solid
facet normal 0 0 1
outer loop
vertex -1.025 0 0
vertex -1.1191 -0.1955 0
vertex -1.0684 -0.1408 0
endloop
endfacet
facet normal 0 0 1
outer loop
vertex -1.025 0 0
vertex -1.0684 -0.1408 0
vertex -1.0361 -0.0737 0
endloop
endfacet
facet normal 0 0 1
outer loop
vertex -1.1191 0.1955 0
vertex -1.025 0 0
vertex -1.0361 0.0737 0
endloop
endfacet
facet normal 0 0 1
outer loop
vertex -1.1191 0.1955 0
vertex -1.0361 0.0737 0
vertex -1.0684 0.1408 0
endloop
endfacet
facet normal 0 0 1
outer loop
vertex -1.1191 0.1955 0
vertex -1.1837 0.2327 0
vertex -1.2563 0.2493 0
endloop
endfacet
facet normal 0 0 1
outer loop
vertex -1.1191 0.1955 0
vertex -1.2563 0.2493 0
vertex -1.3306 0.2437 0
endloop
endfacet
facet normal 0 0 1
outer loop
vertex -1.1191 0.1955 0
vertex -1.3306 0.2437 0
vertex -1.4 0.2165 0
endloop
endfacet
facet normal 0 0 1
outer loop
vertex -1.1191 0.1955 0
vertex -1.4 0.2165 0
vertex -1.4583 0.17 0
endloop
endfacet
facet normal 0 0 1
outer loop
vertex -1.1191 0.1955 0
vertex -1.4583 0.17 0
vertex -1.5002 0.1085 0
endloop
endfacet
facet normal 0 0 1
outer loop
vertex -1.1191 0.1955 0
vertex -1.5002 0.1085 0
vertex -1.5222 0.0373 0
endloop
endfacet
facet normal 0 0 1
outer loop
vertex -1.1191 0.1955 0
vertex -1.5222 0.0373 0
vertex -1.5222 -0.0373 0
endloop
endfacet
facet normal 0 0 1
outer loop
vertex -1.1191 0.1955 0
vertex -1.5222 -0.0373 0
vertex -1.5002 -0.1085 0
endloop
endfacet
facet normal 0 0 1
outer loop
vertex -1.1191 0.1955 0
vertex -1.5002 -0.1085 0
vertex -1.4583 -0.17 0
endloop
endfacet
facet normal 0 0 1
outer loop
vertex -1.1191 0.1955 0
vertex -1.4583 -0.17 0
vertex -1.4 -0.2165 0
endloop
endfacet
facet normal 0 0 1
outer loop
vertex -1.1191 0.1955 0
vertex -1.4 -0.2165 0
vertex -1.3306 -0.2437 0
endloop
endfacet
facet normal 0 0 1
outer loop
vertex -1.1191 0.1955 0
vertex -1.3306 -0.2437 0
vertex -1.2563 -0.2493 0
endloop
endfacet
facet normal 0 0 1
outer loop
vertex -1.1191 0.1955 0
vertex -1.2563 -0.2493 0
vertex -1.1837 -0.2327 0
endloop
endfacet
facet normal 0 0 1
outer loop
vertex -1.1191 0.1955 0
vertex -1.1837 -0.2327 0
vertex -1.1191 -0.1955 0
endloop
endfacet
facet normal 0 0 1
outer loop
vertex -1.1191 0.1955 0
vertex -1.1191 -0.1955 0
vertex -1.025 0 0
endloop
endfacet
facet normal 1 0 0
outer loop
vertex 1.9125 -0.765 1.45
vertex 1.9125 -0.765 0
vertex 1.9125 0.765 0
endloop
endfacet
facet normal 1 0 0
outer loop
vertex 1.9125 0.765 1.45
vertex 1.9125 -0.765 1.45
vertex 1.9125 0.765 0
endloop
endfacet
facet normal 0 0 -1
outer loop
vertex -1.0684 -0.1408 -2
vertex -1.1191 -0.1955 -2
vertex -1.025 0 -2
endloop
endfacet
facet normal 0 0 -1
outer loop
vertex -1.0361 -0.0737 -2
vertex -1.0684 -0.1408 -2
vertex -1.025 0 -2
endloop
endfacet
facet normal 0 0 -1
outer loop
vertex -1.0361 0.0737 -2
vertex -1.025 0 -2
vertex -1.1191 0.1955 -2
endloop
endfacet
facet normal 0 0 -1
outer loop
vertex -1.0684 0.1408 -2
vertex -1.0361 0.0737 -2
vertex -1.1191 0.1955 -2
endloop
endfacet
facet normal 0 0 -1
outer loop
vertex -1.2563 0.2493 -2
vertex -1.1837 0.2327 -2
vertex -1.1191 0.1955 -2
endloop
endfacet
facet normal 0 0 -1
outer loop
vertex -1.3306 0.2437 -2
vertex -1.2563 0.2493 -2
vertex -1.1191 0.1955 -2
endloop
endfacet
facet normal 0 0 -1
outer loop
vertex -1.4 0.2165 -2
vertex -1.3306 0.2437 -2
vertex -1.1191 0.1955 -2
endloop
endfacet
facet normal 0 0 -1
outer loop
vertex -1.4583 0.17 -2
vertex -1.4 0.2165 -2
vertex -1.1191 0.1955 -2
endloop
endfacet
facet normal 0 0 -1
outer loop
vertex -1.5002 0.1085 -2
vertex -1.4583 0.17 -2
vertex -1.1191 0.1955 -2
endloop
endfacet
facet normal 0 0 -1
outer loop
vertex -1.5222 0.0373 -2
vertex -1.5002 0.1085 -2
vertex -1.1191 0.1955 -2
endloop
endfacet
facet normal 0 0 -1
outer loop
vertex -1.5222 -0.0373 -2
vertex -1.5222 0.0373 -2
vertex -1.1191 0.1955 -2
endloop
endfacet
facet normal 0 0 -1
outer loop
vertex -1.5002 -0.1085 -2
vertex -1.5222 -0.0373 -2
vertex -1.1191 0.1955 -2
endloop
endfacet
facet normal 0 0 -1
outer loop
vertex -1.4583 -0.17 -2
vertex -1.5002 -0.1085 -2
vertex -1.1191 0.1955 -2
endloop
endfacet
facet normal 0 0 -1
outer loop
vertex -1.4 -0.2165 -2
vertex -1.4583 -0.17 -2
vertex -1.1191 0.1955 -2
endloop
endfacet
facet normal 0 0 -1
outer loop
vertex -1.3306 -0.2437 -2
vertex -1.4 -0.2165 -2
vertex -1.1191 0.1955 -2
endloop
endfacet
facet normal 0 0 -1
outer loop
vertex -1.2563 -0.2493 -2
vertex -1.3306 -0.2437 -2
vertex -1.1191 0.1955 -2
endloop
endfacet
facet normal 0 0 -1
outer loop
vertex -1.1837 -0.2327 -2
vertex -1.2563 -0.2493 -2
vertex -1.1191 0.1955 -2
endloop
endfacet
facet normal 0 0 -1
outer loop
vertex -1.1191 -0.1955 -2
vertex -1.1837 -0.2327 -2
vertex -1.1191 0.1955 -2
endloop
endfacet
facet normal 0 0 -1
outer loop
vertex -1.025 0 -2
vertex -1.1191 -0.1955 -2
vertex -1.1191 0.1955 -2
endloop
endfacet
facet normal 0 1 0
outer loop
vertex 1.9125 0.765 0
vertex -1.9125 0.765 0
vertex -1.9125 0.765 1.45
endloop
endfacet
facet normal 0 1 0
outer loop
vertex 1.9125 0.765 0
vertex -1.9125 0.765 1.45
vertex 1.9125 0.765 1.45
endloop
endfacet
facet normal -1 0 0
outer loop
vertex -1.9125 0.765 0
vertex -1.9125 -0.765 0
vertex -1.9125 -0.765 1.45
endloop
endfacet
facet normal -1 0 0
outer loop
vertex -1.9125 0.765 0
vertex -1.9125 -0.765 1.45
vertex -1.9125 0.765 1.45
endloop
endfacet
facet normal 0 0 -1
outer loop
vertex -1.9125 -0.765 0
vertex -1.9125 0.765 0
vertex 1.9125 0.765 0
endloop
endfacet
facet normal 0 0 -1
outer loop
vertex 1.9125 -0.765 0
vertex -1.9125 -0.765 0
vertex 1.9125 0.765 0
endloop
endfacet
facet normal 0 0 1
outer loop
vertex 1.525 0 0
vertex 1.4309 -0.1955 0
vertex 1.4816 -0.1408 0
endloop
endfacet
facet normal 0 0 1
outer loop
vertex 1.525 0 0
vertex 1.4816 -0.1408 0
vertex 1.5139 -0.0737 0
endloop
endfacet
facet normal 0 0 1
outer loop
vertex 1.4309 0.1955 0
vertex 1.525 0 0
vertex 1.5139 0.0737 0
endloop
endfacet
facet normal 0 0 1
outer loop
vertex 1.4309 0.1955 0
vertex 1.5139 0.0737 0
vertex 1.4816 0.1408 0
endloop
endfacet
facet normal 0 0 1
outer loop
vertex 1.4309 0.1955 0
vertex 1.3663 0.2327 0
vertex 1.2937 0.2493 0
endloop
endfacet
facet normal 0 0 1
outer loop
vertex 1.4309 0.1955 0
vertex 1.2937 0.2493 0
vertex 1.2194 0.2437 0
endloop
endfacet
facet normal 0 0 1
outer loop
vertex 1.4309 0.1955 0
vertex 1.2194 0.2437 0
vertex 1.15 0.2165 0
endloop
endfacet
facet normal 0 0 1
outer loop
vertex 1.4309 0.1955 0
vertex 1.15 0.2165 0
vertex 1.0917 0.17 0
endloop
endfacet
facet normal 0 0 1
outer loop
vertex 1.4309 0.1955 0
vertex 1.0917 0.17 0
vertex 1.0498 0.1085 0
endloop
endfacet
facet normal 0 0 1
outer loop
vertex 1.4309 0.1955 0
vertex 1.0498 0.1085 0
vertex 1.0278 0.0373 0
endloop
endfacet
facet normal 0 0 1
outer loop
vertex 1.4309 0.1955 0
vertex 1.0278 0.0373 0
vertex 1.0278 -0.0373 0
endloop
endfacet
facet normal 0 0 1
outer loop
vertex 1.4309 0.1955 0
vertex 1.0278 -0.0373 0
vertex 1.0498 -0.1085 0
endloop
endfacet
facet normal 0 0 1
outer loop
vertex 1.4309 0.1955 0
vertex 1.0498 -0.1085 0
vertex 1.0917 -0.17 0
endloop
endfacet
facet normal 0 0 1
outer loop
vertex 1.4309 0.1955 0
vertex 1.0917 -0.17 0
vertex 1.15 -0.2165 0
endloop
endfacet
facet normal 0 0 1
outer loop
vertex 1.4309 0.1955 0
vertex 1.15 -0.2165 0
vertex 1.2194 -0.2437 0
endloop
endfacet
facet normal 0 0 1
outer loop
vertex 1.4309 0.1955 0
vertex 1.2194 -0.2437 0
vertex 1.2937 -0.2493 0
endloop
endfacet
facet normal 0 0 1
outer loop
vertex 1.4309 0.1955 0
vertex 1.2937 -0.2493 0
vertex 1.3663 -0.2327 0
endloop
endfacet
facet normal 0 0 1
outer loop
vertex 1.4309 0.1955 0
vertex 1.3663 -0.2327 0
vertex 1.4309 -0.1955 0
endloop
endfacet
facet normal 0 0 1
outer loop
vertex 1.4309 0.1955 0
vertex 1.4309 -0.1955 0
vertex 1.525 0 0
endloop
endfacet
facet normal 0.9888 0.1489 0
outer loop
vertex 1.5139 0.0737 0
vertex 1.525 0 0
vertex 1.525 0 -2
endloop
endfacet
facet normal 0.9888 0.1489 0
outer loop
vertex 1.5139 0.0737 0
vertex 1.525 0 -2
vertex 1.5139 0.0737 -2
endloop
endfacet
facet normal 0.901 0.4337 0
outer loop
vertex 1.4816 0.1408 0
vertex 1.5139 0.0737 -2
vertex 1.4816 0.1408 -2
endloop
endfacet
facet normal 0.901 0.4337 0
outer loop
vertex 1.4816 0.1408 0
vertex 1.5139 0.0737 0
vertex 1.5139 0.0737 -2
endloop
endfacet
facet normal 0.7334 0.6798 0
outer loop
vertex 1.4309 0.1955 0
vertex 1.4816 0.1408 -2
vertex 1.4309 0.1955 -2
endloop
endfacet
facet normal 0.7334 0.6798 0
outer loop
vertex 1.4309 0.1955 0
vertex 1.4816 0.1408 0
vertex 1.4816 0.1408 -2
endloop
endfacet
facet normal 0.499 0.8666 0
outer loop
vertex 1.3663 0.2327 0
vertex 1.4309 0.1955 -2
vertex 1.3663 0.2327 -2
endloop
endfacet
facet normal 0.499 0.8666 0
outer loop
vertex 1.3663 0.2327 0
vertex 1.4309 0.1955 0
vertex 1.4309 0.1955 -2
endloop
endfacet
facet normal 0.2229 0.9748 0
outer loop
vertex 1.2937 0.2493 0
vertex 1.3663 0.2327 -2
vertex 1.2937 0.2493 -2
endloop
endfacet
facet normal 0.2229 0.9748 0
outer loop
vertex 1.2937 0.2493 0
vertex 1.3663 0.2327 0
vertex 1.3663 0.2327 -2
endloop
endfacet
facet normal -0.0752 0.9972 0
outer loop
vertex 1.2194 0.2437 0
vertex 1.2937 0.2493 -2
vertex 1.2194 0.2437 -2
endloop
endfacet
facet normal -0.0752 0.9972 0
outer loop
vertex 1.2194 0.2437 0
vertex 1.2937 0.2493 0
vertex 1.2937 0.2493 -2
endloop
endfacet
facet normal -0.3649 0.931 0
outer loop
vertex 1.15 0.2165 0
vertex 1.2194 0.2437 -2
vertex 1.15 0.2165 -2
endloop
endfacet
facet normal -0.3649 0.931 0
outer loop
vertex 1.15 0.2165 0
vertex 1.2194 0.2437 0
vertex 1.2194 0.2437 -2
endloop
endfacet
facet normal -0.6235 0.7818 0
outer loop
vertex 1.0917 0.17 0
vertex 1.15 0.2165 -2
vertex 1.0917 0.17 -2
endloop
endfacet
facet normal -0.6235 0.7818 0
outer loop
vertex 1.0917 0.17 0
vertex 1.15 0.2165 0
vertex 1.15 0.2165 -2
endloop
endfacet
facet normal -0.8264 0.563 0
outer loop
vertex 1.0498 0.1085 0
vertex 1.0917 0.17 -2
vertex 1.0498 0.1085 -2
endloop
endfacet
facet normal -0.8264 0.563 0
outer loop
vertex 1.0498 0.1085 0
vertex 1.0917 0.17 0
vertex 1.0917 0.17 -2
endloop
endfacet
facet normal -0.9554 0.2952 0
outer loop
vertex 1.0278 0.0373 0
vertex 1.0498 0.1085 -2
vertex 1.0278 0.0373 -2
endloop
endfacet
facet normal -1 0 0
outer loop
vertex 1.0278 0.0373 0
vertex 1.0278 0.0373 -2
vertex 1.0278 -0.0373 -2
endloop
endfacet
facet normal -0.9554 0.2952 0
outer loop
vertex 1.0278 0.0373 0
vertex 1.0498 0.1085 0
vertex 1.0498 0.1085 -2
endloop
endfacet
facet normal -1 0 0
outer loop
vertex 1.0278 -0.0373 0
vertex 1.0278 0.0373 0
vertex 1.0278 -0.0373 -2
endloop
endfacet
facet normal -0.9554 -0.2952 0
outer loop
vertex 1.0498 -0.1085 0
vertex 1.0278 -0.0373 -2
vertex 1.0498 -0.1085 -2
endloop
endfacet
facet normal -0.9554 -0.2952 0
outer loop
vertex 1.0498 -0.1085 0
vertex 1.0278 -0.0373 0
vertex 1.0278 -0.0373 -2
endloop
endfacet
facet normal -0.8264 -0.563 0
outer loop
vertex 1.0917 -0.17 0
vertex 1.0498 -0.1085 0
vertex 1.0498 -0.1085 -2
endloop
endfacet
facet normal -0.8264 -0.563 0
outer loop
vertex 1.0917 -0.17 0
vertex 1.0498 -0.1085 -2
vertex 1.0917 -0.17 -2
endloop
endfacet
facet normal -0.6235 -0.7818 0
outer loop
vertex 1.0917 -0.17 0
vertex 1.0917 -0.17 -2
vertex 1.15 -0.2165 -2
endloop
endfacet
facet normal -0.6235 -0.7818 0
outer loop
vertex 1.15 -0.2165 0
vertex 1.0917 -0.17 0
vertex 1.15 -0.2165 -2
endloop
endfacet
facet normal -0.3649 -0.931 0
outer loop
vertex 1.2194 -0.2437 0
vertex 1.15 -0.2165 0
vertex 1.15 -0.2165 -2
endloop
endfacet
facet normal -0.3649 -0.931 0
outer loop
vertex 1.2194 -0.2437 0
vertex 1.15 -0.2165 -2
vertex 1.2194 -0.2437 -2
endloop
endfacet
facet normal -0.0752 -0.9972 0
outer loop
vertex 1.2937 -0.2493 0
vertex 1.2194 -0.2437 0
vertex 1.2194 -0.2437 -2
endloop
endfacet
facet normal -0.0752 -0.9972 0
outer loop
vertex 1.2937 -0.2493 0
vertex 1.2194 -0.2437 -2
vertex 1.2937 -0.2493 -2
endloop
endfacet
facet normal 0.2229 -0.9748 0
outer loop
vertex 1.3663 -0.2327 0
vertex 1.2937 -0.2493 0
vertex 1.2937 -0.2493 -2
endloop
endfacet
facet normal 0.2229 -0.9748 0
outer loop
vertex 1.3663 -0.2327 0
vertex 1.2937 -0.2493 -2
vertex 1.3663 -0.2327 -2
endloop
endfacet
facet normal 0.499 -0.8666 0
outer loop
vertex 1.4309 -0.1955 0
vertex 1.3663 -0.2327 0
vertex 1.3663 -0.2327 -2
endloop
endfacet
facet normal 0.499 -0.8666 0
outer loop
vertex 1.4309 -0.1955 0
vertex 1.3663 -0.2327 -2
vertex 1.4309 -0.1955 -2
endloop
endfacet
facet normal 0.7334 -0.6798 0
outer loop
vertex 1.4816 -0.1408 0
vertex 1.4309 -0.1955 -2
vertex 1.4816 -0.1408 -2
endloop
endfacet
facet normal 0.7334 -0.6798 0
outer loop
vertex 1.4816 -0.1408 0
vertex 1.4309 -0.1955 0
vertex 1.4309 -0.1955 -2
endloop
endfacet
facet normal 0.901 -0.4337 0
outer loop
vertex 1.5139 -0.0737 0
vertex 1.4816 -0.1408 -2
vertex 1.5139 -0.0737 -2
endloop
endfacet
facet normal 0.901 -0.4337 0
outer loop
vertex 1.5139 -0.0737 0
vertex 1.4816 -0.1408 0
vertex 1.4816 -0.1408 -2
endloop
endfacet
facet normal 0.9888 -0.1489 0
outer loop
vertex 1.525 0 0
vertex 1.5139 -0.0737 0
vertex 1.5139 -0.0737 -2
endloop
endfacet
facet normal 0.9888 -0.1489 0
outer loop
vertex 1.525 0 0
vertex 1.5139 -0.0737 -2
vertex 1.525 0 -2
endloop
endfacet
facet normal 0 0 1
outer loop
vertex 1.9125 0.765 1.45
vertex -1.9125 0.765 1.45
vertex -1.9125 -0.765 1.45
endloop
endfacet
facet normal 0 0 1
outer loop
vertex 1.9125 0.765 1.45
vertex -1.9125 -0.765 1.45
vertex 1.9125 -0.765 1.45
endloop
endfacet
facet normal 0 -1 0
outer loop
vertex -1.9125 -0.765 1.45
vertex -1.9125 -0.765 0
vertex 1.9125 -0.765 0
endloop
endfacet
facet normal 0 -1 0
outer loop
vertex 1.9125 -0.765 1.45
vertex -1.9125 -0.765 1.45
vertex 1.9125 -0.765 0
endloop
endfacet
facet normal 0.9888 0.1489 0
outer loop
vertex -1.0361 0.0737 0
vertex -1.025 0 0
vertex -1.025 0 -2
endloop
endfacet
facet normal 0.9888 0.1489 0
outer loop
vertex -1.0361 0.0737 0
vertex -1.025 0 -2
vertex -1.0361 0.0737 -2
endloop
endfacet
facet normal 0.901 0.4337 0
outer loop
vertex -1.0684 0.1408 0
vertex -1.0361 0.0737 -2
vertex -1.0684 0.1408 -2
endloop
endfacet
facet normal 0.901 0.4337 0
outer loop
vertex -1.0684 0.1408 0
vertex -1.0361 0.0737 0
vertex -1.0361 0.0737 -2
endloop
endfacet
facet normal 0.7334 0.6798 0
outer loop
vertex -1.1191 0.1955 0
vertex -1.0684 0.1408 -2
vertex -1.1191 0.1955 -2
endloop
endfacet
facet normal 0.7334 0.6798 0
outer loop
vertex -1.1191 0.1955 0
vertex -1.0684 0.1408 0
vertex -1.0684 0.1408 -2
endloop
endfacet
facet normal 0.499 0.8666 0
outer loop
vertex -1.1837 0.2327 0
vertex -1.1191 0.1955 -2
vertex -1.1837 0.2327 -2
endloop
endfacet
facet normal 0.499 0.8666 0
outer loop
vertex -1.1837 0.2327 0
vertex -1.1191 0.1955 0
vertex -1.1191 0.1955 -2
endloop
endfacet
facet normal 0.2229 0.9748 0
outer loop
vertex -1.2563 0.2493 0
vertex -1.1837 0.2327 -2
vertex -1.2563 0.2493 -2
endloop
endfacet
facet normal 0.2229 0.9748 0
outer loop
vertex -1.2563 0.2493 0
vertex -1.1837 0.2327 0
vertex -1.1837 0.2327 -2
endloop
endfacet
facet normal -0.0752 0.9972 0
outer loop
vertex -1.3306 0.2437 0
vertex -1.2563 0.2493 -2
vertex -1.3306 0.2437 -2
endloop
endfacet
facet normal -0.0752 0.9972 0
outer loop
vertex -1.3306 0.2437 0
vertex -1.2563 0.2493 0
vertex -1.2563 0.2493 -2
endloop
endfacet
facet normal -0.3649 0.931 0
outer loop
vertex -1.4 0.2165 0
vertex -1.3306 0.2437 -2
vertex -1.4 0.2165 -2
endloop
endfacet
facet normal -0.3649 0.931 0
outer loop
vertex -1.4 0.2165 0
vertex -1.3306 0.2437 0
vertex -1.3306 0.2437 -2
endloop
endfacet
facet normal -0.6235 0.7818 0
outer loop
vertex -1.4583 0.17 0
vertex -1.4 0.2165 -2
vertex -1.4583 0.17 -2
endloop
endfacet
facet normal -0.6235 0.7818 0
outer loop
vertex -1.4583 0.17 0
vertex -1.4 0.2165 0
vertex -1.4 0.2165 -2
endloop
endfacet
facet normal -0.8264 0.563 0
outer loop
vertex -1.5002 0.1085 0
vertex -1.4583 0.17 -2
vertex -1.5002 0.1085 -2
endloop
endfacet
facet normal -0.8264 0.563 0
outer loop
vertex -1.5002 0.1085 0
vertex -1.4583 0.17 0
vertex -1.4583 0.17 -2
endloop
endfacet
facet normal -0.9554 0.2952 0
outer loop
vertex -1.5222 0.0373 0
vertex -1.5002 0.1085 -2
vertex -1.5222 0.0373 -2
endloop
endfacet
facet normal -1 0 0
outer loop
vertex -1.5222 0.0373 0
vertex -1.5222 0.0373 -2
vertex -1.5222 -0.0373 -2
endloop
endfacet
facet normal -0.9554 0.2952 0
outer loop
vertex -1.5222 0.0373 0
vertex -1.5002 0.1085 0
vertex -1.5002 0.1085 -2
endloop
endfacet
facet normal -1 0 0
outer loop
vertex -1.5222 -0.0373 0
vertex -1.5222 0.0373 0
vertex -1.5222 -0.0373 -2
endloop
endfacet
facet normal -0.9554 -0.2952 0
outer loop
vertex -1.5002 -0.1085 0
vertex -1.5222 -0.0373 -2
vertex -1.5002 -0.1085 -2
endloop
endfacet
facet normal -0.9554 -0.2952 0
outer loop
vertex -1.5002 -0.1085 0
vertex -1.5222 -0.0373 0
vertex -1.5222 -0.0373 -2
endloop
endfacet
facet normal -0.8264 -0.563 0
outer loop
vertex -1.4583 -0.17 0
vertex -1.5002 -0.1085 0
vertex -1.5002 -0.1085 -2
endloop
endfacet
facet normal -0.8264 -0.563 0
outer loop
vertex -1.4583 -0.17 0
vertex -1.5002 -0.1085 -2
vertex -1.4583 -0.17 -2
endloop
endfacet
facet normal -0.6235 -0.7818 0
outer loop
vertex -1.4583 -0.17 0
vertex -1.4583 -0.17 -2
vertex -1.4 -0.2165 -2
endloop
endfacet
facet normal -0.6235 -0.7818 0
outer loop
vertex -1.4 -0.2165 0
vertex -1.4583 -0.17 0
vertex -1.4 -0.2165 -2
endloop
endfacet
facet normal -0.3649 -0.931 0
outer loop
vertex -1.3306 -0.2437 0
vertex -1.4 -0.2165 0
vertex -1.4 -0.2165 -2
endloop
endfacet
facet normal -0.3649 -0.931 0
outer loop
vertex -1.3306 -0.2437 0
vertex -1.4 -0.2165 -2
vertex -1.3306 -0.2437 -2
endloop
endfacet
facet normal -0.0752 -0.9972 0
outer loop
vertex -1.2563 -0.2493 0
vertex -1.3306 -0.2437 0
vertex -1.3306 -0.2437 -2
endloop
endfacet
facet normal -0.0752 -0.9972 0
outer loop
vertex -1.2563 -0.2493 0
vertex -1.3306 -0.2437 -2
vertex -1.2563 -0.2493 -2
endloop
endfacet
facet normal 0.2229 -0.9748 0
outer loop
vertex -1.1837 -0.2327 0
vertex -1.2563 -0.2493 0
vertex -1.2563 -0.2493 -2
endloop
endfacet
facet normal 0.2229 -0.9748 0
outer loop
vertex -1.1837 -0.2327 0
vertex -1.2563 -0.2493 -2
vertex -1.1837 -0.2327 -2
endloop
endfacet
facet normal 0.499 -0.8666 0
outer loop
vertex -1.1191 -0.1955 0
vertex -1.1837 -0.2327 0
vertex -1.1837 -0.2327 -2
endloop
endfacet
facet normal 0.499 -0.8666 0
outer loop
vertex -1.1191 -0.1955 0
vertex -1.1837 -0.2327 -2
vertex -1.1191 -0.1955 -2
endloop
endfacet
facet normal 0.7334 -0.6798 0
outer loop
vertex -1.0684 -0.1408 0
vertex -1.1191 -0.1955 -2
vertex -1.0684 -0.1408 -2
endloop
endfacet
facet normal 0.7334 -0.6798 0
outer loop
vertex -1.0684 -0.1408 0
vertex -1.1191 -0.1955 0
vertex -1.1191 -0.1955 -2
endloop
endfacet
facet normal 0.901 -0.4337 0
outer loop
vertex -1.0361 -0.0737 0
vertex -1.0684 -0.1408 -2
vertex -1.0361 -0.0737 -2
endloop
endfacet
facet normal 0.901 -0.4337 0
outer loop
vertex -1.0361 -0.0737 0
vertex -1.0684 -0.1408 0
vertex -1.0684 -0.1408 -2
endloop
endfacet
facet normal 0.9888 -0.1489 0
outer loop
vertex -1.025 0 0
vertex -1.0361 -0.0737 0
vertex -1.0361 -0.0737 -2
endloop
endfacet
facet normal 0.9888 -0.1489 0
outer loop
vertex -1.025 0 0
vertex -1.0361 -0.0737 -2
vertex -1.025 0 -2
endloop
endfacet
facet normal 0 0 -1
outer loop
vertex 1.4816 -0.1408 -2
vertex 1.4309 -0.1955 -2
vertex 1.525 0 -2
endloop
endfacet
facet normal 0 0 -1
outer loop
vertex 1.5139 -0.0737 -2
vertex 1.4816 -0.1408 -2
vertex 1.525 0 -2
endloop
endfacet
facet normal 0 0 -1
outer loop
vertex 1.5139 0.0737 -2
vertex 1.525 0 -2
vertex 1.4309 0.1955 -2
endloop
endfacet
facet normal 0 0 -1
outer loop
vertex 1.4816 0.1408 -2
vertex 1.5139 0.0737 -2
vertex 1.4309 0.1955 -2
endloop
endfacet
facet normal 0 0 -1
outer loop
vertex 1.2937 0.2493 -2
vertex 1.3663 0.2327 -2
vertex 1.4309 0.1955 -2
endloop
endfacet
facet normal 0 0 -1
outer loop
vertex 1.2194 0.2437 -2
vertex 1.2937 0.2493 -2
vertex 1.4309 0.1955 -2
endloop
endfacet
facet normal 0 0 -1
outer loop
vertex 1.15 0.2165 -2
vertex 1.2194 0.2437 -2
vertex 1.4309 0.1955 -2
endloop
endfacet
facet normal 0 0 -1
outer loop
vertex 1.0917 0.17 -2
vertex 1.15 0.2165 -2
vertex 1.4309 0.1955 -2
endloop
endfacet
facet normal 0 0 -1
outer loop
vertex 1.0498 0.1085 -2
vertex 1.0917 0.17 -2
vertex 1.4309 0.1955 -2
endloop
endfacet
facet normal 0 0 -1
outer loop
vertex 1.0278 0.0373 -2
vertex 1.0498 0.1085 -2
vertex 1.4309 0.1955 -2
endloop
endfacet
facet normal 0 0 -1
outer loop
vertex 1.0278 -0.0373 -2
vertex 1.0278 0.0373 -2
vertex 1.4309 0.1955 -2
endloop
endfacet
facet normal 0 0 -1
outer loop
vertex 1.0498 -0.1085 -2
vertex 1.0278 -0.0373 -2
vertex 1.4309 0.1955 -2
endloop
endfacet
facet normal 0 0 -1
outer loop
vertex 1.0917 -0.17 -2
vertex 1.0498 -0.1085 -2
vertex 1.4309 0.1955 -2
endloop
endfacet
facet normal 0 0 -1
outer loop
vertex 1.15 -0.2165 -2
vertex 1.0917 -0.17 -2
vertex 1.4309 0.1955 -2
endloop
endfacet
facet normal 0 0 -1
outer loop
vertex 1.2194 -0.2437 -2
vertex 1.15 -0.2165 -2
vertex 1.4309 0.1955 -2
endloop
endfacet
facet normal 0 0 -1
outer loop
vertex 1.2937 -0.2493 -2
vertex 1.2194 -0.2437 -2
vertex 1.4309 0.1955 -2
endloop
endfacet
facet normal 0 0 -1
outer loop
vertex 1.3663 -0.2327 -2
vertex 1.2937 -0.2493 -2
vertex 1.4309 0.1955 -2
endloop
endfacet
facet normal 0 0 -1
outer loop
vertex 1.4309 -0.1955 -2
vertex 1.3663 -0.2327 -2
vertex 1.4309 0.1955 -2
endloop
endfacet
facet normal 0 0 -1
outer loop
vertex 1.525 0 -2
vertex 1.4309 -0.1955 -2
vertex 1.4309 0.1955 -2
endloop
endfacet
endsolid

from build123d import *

# Parameters (mm, degrees)
SKETCH1_W               = 3.825
SKETCH1_H               = 1.53
COMPONENT_OUTLINE_DEPTH = 1.45
SKETCH2_R               = 0.25
EXTRUDE_1_DEPTH         = 2
SKETCH3_R               = 0.25
EXTRUDE_2_DEPTH         = 2


with BuildPart() as part:
    # Sketch1 → Component_Outline (new body)
    with BuildSketch(Plane.XY):
        Rectangle(SKETCH1_W, SKETCH1_H)
    extrude(amount=COMPONENT_OUTLINE_DEPTH)


with BuildPart() as body_2:
    # Sketch2 → Extrude 1 (new body)
    with BuildSketch(Plane.XY):
        with Locations((-1.275, 0)):
            Circle(SKETCH2_R)
    extrude(amount=-EXTRUDE_1_DEPTH)


with BuildPart() as body_3:
    # Sketch3 → Extrude 2 (new body)
    with BuildSketch(Plane.XY):
        with Locations((1.275, 0)):
            Circle(SKETCH3_R)
    extrude(amount=-EXTRUDE_2_DEPTH)


solid = Compound([part.part, body_2.part, body_3.part])
